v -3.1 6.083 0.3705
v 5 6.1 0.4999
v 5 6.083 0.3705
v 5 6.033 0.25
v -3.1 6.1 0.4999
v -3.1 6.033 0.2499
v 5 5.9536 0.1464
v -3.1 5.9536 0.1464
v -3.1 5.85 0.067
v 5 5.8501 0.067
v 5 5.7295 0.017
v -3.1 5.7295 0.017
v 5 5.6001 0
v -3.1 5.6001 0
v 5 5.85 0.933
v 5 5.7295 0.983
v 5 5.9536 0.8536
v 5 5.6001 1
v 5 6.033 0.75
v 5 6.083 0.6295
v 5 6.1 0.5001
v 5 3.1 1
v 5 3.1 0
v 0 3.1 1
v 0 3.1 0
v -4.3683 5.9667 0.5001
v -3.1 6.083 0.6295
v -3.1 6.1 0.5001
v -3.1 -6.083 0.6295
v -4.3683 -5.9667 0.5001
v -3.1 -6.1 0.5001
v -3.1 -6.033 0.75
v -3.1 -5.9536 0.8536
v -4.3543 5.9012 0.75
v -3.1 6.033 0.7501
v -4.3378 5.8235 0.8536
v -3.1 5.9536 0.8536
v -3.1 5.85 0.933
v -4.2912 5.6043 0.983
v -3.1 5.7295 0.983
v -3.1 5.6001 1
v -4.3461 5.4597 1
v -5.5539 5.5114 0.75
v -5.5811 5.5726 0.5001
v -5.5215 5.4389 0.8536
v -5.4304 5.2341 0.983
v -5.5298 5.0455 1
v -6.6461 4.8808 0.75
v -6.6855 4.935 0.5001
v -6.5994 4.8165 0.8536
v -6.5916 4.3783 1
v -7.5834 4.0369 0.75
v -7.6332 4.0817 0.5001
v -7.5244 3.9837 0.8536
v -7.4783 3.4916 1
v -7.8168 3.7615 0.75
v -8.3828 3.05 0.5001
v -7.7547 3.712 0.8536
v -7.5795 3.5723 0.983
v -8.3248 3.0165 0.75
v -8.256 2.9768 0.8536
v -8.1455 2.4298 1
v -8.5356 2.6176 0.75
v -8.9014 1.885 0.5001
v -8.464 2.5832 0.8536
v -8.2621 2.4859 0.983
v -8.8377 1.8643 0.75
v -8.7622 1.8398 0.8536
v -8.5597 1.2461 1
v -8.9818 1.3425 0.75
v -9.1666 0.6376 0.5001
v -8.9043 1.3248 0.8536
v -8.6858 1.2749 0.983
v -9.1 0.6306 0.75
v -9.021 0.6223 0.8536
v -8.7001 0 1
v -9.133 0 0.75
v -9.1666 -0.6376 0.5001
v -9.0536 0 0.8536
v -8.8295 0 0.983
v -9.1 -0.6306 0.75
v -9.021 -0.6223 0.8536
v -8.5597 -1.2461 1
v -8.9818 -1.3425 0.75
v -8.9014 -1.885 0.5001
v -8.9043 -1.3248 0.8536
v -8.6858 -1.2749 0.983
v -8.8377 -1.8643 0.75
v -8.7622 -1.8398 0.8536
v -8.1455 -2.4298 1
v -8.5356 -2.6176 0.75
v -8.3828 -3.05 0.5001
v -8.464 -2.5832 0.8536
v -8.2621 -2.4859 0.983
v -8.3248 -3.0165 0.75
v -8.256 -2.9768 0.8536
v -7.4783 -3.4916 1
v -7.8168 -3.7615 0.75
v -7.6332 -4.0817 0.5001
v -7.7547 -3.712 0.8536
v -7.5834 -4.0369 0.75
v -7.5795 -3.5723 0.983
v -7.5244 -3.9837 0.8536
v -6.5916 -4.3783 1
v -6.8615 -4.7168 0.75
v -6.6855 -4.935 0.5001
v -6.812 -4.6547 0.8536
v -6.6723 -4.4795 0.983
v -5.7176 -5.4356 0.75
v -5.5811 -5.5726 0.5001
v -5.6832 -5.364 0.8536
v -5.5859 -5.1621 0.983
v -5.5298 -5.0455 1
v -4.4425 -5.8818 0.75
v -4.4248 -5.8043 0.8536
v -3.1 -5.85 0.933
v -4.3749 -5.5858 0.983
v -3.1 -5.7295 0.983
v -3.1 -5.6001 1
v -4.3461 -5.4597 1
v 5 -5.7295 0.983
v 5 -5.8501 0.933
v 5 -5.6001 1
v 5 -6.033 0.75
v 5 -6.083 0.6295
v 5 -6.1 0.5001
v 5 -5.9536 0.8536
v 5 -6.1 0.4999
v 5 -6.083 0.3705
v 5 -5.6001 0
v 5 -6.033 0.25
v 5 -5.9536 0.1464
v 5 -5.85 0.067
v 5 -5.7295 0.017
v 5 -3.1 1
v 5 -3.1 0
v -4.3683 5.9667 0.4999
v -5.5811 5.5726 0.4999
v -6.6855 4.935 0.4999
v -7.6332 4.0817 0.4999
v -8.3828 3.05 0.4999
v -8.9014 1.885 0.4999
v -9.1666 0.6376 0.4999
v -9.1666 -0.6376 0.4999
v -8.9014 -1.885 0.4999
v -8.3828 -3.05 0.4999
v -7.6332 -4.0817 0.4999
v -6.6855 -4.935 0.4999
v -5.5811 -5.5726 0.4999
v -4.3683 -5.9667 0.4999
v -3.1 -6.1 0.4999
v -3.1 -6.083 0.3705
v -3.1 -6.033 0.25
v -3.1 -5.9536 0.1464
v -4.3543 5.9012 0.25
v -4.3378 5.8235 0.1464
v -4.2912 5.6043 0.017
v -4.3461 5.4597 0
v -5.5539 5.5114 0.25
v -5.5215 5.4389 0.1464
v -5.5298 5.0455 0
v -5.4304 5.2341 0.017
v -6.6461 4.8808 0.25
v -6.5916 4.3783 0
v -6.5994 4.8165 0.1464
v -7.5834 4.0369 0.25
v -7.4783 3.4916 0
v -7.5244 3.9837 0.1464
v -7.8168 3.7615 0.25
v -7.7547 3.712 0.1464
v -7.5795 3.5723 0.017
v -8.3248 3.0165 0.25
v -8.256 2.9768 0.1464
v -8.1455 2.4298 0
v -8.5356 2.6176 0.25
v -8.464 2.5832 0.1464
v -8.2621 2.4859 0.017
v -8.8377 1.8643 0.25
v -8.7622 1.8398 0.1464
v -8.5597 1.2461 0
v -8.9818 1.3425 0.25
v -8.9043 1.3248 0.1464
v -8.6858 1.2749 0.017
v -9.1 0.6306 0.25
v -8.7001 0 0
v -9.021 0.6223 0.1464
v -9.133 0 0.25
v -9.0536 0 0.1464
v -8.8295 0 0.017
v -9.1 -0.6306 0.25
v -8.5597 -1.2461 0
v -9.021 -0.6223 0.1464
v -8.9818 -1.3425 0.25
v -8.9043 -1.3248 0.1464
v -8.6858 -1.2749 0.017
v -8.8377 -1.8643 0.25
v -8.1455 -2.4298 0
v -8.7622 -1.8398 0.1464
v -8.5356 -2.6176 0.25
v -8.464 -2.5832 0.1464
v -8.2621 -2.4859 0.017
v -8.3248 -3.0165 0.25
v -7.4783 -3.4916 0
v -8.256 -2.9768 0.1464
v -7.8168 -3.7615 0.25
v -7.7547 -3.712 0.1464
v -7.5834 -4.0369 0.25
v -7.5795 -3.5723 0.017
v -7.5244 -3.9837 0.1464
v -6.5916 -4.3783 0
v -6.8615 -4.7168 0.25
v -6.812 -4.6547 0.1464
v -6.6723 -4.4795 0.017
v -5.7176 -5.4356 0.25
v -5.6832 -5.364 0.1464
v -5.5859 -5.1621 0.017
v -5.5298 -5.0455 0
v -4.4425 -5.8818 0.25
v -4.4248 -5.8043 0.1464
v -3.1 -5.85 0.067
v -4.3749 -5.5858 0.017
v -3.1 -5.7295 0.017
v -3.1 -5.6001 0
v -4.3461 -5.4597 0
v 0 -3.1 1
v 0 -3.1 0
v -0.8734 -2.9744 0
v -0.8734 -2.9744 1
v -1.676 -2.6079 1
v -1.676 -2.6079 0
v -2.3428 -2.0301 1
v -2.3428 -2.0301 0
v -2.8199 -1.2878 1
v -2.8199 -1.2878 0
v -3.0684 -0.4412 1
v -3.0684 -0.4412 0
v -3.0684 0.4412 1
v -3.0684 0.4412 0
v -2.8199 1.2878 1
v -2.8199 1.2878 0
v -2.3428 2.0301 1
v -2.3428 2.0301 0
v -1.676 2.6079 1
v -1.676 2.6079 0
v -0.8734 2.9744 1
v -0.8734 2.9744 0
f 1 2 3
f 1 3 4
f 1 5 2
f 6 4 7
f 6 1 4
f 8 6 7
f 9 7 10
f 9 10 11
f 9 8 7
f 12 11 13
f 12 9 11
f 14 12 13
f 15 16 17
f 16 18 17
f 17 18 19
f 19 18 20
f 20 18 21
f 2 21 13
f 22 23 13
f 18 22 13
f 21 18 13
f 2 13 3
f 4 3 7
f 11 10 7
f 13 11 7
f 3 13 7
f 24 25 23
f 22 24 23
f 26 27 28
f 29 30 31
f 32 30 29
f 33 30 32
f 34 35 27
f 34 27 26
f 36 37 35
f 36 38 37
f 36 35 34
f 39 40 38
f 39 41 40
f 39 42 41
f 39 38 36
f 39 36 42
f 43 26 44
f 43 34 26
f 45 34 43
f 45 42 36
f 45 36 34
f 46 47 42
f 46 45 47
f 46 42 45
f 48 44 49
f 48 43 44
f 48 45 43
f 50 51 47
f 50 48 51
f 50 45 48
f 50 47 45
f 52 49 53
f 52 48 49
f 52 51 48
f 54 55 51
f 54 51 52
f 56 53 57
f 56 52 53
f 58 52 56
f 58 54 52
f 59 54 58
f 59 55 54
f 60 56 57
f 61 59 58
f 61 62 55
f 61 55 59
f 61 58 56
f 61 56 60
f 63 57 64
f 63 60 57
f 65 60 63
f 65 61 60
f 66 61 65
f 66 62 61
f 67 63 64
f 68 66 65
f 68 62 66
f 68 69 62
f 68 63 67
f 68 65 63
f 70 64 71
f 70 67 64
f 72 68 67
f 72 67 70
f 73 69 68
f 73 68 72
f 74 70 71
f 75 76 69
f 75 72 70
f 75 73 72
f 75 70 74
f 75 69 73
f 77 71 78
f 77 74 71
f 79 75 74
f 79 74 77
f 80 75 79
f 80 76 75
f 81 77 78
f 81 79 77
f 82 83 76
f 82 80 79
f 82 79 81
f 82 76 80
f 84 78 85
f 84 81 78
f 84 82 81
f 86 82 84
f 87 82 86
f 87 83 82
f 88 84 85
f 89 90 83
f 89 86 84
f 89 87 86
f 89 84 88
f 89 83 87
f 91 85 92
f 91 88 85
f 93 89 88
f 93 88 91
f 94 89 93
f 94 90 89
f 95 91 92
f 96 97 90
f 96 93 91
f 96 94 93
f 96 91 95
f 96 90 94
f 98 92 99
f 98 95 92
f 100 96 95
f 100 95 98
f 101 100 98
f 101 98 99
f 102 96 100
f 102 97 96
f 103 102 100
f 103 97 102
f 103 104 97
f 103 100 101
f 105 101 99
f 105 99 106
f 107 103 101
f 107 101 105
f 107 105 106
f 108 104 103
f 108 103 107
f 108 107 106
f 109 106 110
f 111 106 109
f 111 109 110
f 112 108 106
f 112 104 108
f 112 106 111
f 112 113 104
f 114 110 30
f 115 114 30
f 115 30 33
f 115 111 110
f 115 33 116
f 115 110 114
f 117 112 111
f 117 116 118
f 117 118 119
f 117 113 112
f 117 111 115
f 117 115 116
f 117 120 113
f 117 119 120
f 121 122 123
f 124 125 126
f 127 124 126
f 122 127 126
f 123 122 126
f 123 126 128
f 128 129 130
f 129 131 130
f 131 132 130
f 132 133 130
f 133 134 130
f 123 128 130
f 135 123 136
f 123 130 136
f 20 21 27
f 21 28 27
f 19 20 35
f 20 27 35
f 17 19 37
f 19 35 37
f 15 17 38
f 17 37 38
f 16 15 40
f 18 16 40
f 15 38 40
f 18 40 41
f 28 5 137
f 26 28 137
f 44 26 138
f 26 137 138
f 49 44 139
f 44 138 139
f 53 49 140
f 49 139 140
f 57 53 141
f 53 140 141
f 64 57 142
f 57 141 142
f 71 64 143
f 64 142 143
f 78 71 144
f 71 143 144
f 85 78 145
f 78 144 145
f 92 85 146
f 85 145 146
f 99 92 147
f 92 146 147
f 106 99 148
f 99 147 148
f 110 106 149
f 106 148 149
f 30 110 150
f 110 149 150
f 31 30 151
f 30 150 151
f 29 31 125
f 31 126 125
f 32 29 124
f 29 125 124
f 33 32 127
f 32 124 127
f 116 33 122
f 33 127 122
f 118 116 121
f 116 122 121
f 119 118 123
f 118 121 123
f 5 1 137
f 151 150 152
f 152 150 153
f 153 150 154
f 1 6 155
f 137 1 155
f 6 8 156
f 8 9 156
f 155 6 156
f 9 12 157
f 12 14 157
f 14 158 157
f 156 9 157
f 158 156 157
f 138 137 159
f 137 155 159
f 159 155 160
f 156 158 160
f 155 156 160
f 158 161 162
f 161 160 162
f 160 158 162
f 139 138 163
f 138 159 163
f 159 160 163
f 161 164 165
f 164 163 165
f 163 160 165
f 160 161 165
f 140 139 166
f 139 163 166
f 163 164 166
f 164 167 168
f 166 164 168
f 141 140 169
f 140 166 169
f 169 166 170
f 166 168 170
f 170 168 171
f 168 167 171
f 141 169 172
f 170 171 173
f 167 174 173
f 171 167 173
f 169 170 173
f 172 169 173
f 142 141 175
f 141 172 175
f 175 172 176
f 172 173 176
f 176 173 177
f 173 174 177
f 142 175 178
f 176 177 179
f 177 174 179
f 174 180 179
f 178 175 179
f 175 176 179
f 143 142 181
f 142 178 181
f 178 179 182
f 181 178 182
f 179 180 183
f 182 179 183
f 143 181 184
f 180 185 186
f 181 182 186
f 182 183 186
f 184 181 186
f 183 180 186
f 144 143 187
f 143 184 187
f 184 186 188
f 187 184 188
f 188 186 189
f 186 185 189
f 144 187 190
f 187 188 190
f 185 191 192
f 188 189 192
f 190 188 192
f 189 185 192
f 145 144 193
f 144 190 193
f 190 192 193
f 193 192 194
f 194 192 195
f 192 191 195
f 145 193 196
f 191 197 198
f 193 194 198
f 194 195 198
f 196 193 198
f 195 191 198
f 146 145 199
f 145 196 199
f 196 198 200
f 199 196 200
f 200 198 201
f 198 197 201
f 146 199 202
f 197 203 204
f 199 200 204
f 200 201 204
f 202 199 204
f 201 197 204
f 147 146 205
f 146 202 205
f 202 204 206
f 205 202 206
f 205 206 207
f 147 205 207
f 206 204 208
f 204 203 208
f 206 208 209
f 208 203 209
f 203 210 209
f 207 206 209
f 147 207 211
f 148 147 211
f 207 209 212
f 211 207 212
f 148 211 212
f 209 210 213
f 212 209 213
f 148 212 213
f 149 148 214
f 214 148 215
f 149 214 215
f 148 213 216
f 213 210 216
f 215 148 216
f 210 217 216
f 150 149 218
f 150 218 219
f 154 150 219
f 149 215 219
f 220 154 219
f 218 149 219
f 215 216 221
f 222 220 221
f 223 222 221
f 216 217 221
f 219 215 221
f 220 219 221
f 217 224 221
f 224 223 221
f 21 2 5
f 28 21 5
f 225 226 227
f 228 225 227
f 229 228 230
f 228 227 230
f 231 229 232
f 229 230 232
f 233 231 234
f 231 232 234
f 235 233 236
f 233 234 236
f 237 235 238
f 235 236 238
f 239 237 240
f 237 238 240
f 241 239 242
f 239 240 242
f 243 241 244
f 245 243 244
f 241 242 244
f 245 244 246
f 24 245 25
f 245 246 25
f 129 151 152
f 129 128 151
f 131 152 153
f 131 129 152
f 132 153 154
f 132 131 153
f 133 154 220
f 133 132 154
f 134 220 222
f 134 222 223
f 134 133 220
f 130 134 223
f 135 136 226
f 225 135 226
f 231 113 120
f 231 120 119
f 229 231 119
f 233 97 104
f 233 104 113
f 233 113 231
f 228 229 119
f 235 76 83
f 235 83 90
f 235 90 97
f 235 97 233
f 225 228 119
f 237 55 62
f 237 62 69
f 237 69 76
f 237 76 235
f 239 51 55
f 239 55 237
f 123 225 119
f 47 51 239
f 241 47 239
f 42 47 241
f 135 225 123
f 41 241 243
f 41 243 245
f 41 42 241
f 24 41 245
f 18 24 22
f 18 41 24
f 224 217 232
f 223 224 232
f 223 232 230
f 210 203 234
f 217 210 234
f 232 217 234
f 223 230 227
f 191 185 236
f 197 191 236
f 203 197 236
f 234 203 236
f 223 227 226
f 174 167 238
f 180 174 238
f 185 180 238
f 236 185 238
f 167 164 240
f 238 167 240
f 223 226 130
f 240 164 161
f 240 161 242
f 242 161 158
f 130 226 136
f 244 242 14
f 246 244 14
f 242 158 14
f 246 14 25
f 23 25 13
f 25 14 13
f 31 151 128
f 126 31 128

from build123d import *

# Parameters (mm, degrees)
BOSS_EXTRUDE1_DEPTH = 1
FILLET1_R           = 0.5


with BuildPart() as part:
    # Sketch1 → Boss-Extrude1 (new body)
    with BuildSketch(Plane.XY):
        with BuildLine():
            Line((0, 3.1), (5, 3.1))
            Line((5, 3.1), (5, 6.1))
            Line((5, 6.1), (-3.1, 6.1))
            ThreePointArc((-3.1, 6.1), (-9.2, 0), (-3.1, -6.1))
            Line((-3.1, -6.1), (5, -6.1))
            Line((5, -6.1), (5, -3.1))
            Line((5, -3.1), (0, -3.1))
            ThreePointArc((0, -3.1), (-3.1, 0), (0, 3.1))
        make_face()
    extrude(amount=BOSS_EXTRUDE1_DEPTH)

    # Fillet1
    fillet1_edges = [part.edges().sort_by_distance(p)[0] for p in [
        (0.95, 6.1, 0),
        (0.95, -6.1, 0),
        (0.95, 6.1, 1),
        (0.95, -6.1, 1),
        (-9.2, 0, 0),
        (-9.2, 0, 1),
    ]]
    fillet(fillet1_edges, radius=FILLET1_R - 0.0001)  # a hair under: the kernel refuses the full size


solid = part.part
